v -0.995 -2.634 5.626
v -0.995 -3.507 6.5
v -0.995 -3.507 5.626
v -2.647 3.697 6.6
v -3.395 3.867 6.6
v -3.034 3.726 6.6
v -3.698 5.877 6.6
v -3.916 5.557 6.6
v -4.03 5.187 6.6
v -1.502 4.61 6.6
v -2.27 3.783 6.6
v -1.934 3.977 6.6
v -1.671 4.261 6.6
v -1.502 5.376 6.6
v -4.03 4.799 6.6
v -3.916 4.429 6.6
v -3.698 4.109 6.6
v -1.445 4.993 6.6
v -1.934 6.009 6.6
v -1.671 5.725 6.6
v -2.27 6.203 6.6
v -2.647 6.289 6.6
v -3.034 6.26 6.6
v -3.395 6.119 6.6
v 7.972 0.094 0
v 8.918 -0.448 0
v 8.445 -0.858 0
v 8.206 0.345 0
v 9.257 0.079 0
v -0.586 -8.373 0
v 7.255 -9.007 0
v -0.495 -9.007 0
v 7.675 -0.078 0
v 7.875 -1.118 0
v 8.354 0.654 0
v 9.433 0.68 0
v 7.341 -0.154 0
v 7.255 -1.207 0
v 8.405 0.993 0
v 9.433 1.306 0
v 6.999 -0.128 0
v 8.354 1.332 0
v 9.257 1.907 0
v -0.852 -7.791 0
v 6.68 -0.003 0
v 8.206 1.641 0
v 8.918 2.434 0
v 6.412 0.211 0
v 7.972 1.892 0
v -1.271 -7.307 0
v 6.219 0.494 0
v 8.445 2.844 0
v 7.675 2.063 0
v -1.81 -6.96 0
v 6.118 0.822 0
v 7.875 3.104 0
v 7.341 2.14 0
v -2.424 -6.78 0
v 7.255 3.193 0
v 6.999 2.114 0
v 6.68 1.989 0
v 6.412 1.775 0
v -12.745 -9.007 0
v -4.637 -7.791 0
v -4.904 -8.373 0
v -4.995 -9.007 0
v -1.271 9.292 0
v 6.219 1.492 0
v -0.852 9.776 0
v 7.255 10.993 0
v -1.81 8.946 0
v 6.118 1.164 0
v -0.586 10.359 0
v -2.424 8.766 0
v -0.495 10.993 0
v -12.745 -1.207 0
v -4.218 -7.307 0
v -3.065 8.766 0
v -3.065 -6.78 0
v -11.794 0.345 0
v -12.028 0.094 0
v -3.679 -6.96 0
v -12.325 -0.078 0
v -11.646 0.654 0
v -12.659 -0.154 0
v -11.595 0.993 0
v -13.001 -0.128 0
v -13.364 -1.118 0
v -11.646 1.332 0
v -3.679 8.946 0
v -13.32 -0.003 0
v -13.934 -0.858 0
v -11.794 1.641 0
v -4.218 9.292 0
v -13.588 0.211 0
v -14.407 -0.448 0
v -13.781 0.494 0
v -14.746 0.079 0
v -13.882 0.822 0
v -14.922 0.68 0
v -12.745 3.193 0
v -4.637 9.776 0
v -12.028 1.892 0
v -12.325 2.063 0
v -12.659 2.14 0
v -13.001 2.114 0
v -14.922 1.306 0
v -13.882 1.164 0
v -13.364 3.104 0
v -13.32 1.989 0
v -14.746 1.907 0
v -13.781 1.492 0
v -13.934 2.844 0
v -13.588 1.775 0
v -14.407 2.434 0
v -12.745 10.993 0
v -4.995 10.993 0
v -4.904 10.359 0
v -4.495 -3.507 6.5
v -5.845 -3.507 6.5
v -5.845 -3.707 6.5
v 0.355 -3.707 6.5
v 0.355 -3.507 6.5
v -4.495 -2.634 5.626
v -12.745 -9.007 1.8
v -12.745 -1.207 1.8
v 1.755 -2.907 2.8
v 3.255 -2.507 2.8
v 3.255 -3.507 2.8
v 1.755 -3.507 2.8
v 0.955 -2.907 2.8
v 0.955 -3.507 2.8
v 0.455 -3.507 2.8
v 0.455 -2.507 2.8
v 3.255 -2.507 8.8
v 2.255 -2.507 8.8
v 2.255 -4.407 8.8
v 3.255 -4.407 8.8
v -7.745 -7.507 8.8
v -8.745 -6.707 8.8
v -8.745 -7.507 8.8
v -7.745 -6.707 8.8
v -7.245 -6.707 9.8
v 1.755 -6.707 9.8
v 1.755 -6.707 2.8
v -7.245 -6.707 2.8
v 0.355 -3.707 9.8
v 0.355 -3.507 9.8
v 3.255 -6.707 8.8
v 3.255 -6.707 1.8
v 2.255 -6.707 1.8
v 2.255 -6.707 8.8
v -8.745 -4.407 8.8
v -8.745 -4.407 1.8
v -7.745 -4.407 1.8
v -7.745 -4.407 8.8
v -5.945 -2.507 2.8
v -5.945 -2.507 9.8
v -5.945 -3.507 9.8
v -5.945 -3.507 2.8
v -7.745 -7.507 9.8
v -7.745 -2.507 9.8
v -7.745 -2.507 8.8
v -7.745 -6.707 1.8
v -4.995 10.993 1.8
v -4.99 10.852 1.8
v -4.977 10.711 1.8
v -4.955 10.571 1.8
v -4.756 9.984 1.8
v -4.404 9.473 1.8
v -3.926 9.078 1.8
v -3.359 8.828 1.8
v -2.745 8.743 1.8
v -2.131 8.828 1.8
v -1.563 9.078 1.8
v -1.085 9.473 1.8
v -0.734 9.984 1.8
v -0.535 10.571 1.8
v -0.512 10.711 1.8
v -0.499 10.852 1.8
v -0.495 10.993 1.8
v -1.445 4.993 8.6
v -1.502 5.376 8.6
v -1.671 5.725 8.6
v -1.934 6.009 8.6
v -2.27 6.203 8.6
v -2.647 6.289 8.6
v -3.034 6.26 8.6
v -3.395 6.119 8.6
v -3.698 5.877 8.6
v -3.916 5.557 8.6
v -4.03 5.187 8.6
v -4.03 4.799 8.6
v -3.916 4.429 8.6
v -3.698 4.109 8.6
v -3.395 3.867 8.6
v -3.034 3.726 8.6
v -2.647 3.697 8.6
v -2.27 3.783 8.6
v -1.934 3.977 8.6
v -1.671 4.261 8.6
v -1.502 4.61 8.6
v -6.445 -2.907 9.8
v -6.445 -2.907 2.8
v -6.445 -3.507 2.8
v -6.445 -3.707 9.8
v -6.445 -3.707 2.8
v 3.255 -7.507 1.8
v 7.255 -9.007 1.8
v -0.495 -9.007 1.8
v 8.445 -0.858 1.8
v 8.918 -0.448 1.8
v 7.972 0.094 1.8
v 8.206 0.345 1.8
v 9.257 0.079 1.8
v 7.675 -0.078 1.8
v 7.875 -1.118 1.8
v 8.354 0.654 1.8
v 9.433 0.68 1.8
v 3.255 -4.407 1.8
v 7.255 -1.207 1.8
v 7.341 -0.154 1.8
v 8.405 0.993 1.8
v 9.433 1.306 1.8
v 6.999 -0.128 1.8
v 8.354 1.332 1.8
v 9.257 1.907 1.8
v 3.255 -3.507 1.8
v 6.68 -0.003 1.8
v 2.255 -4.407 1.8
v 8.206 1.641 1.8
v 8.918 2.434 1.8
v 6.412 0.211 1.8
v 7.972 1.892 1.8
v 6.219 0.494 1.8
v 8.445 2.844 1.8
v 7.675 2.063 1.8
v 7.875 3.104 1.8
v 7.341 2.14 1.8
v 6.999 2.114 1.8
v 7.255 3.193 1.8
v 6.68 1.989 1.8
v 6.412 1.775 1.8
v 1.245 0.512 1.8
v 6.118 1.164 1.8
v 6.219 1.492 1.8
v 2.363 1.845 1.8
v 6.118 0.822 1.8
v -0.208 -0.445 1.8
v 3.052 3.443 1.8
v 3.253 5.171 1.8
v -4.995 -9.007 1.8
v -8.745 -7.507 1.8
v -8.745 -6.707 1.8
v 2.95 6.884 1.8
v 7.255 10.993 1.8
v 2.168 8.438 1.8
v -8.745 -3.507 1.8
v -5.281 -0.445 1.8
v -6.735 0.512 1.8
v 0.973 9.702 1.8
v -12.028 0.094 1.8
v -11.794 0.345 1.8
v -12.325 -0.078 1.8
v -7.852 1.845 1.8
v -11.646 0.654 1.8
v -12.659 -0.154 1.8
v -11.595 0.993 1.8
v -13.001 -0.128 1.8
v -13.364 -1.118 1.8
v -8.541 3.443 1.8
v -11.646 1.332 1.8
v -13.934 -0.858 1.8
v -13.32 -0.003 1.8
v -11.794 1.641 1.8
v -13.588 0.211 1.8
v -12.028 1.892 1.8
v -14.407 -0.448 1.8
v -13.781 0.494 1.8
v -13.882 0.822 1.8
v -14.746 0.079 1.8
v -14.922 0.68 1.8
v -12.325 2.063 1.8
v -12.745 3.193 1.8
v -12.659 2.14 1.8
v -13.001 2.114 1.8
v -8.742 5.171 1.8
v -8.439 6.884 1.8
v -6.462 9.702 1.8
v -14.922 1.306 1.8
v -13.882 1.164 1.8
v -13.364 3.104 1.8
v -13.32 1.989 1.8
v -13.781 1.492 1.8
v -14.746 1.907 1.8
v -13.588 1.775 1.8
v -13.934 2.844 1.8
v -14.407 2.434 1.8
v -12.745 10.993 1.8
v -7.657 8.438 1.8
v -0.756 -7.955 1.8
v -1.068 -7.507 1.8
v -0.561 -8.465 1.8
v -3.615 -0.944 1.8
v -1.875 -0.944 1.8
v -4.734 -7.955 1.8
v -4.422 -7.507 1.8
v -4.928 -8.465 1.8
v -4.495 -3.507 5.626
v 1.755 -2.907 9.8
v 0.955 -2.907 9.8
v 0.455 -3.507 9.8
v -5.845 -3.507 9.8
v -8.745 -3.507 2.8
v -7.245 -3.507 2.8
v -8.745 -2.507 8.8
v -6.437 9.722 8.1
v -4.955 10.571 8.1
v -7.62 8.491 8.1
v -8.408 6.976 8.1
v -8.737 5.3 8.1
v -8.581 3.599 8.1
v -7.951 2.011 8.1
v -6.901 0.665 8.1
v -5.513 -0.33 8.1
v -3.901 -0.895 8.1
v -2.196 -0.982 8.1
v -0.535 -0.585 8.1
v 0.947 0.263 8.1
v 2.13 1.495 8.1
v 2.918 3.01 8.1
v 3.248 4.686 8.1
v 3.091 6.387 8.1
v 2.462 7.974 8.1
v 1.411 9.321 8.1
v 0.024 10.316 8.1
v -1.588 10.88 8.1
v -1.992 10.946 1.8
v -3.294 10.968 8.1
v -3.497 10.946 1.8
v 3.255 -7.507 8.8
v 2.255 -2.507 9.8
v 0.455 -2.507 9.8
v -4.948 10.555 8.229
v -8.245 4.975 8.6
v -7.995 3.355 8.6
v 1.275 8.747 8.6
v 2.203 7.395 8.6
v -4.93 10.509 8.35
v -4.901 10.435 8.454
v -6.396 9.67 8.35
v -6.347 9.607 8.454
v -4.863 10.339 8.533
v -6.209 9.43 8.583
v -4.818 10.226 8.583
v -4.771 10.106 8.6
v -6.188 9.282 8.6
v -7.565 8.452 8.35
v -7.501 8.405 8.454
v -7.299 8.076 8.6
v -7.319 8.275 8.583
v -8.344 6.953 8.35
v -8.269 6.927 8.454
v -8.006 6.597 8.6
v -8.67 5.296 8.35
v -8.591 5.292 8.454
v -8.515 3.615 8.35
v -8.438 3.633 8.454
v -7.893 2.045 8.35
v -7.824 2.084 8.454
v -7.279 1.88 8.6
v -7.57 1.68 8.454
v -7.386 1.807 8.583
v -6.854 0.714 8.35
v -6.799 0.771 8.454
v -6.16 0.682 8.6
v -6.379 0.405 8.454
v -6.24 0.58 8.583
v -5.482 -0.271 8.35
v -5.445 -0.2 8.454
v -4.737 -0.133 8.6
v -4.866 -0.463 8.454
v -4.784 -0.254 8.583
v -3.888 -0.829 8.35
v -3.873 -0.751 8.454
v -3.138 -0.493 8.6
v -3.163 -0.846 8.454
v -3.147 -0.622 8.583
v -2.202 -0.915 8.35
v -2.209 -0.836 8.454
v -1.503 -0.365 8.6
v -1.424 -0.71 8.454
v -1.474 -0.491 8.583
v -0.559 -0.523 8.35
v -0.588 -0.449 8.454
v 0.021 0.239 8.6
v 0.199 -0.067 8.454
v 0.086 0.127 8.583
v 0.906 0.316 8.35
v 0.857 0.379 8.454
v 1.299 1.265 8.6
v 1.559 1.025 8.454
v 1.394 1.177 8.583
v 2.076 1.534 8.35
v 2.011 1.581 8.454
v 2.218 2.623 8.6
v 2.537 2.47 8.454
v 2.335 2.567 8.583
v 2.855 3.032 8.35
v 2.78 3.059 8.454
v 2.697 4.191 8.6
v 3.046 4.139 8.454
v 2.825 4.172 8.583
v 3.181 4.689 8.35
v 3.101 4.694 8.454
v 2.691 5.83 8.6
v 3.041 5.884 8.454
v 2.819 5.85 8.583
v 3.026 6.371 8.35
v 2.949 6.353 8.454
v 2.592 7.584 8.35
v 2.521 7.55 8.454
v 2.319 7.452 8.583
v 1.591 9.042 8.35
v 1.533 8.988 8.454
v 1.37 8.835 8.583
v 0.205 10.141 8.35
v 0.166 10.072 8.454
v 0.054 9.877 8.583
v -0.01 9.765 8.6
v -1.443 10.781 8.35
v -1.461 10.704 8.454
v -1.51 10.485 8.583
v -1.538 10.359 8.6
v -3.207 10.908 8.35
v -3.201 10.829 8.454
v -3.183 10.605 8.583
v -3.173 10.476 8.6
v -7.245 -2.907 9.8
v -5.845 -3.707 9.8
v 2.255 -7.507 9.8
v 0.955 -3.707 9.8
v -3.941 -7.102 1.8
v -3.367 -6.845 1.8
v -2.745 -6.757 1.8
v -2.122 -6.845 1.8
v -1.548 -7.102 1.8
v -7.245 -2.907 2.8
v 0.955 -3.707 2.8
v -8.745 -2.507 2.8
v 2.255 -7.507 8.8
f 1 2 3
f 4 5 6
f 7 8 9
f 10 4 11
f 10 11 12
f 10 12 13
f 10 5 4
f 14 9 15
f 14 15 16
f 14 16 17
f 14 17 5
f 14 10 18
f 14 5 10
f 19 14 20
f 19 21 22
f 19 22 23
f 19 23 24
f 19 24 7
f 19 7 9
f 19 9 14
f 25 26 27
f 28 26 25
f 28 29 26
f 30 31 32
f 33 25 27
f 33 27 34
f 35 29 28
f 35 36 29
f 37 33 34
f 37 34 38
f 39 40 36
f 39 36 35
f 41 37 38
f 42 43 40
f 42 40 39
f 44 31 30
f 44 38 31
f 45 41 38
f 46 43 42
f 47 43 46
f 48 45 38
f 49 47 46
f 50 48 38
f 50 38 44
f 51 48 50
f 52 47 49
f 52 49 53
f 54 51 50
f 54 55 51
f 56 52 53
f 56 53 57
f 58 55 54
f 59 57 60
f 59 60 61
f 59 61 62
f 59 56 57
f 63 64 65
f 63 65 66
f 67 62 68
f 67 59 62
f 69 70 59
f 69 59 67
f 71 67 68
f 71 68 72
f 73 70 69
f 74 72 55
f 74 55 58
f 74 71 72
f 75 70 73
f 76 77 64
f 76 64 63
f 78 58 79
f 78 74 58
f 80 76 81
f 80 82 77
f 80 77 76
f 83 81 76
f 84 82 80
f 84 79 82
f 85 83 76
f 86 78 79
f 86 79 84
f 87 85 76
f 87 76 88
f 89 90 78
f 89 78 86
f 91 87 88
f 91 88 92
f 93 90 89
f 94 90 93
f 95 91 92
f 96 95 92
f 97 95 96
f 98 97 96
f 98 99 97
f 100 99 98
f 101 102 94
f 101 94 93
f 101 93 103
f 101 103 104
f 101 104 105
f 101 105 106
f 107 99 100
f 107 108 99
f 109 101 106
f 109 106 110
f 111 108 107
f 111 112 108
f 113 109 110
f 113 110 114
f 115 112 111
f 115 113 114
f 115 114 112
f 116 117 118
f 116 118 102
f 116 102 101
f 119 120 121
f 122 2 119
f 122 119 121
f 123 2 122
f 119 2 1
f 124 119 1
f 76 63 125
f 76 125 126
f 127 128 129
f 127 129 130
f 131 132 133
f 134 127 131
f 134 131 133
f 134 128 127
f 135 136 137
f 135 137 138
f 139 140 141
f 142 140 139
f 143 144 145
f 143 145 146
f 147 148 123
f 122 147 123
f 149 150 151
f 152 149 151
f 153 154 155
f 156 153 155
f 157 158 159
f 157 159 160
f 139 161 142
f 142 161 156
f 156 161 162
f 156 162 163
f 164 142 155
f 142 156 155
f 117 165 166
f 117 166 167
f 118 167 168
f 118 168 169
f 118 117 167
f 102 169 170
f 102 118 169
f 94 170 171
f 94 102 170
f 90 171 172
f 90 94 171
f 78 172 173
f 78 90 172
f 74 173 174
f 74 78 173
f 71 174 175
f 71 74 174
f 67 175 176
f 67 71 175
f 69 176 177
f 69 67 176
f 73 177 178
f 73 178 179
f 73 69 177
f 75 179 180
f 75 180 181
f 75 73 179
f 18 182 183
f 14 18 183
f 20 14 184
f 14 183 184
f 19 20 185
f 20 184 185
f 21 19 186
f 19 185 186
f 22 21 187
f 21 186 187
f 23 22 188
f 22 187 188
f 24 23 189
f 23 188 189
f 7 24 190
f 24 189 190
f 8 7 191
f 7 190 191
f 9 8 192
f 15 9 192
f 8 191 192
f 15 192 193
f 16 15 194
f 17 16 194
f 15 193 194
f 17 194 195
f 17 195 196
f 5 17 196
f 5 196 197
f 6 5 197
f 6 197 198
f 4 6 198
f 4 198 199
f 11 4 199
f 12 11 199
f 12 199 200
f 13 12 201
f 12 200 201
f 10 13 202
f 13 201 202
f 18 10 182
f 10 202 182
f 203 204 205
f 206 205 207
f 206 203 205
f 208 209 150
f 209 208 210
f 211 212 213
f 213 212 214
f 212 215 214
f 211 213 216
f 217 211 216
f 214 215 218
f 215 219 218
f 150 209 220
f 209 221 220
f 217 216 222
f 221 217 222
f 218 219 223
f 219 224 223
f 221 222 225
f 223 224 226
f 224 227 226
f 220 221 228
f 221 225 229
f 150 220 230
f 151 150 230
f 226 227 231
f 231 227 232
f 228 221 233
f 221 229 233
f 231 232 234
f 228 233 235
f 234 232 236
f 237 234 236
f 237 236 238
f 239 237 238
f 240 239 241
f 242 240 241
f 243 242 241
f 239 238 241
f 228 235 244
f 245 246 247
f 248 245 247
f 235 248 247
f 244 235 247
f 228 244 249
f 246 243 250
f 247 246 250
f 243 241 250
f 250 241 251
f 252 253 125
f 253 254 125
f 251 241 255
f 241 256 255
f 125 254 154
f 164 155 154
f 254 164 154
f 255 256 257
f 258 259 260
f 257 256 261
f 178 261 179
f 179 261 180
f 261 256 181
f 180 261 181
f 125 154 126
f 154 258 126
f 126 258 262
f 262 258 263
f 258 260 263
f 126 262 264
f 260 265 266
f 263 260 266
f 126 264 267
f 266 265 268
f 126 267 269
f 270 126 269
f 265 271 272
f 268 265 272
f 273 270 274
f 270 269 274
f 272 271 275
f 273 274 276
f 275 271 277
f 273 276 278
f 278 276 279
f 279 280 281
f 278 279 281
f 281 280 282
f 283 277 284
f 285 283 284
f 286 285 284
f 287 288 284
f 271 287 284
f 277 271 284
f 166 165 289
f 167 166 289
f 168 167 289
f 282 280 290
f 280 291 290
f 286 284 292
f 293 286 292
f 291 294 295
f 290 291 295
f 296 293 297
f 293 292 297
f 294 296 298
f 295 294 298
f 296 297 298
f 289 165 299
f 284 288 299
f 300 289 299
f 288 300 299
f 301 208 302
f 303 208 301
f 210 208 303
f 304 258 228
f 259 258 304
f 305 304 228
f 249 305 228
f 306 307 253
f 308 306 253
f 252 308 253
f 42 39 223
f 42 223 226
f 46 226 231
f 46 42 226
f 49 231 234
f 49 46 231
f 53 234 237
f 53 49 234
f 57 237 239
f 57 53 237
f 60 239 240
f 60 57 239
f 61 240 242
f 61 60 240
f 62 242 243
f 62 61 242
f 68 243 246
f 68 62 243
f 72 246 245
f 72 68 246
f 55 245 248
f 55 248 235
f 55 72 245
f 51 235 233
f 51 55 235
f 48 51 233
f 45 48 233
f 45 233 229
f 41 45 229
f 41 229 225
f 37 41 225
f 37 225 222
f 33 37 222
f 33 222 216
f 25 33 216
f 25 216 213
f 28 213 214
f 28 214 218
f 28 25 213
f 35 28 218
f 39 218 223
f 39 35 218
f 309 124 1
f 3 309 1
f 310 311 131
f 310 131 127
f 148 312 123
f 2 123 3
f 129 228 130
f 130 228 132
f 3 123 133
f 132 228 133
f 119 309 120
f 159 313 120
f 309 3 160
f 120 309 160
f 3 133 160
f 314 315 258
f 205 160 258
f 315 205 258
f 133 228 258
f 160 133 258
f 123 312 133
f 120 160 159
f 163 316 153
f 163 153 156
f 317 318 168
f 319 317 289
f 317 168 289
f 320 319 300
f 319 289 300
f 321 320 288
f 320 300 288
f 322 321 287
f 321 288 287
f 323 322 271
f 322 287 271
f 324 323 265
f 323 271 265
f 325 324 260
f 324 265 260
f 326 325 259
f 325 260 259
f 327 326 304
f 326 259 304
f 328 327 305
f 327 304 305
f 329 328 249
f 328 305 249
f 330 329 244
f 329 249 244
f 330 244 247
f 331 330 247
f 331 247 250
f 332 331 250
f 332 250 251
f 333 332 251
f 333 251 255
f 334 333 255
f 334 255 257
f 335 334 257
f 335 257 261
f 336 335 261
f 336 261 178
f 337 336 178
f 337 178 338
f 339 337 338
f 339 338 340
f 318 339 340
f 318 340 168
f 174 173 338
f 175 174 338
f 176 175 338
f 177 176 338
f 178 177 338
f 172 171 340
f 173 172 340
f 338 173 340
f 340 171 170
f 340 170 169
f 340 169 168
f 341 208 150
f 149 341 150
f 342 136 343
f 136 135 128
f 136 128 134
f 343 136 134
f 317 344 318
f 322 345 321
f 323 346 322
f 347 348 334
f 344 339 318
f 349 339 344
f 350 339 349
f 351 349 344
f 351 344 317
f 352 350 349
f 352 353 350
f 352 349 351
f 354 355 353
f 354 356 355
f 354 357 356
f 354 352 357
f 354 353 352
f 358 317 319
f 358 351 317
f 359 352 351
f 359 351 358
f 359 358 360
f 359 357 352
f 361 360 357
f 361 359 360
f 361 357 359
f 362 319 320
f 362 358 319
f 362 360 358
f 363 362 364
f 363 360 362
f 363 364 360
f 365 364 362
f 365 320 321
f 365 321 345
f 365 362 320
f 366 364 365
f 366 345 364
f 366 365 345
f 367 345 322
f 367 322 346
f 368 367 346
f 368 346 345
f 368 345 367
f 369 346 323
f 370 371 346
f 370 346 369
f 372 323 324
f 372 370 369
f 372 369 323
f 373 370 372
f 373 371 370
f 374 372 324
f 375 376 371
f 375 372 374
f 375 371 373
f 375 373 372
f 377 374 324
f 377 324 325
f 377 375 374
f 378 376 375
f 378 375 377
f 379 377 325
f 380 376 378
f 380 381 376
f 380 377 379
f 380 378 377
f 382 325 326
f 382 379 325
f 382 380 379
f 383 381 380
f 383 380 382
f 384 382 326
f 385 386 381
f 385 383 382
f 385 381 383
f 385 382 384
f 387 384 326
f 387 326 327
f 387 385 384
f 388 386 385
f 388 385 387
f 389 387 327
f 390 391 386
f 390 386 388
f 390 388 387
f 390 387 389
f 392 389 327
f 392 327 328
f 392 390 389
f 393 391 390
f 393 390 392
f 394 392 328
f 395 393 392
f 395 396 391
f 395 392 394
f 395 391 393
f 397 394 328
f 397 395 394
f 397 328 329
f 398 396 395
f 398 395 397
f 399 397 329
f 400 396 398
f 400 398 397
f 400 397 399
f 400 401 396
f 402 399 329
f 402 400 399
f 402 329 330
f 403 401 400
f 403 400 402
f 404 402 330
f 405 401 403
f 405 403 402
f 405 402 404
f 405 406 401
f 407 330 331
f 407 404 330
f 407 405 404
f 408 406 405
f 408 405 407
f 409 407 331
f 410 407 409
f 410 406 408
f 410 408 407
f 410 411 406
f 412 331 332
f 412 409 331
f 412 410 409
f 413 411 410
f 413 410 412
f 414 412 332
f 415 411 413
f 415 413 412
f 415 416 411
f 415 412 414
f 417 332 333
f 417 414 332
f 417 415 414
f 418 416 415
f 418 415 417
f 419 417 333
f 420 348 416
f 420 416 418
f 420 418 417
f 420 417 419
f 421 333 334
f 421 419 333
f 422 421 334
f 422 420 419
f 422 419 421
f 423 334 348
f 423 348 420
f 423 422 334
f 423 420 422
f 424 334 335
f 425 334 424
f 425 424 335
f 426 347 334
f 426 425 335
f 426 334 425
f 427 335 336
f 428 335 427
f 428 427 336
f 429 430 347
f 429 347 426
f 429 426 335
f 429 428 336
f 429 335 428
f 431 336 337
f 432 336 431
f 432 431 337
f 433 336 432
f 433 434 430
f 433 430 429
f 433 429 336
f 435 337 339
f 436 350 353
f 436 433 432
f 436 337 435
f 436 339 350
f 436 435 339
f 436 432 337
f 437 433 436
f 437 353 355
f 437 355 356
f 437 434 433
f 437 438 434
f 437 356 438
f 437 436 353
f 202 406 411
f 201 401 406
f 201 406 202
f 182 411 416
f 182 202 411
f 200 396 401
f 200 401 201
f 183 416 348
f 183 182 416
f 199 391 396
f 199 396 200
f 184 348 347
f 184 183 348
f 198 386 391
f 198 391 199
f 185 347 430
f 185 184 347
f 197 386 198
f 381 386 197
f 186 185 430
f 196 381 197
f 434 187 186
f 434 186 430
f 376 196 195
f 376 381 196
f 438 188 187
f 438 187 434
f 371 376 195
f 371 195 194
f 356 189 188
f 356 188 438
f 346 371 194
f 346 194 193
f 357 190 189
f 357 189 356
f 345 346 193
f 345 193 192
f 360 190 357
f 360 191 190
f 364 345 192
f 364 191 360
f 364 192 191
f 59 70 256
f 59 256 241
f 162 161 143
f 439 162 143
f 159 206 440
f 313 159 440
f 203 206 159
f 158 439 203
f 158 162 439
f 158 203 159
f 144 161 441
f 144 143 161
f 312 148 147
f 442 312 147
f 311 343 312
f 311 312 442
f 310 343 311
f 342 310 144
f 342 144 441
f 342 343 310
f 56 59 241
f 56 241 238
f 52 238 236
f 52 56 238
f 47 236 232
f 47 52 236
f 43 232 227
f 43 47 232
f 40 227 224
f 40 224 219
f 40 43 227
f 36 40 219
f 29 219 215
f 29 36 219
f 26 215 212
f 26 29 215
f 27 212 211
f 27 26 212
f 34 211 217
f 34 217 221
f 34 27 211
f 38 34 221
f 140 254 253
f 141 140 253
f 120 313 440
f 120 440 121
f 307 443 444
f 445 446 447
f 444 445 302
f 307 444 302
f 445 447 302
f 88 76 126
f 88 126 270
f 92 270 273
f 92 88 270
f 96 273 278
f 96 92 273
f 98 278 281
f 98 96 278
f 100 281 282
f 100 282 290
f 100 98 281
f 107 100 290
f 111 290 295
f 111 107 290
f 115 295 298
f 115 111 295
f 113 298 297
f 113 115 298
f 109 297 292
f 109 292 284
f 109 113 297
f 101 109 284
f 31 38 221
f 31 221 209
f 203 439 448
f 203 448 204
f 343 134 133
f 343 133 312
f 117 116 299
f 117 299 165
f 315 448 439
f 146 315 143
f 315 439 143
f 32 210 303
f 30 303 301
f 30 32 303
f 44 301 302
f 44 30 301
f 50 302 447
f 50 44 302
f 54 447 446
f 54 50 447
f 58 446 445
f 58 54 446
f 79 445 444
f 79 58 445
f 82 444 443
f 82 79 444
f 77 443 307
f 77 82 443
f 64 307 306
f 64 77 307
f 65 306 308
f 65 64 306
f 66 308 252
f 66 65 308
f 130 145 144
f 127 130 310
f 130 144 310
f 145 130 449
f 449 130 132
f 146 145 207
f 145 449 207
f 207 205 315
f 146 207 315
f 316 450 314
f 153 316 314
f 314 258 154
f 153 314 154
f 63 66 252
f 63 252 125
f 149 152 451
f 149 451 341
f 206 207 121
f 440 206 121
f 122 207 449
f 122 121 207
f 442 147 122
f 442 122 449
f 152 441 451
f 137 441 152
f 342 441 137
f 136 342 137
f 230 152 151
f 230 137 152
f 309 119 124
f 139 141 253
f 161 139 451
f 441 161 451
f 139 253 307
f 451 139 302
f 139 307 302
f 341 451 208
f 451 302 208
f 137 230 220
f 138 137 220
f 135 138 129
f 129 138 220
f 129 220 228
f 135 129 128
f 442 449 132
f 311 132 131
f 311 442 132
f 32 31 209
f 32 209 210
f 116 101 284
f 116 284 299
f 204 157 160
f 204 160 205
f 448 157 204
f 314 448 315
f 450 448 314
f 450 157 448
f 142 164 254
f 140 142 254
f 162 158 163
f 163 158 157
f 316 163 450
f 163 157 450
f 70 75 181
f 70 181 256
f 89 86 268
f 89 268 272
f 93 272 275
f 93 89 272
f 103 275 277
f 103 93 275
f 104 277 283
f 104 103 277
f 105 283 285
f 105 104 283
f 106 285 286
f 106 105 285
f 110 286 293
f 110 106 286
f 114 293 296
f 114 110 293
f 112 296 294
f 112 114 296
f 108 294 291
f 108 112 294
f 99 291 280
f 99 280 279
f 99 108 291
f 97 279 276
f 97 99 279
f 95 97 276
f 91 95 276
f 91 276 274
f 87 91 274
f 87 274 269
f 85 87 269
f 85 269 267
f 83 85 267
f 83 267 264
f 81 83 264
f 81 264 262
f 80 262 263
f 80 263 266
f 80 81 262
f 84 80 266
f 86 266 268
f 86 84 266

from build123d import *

# Parameters (mm, degrees)
ESQUISSE1_R             = 1.15
BOSS_EXTRU_1_DEPTH      = 1.8
BOSS_EXTRU_2_DEPTH      = 8
ENL_V_MAT_EXTRU_1_DEPTH = 7
ESQUISSE4_W             = 3.5
ESQUISSE4_H             = 0.873592076
ENL_V_MAT_EXTRU_2_DEPTH = 1
ESQUISSE5_W             = 1
ESQUISSE5_H             = 1
ENL_V_MAT_EXTRU_3_DEPTH = 11
ESQUISSE6_W             = 6.2
ESQUISSE6_H             = 3.3
ENL_V_MAT_EXTRU_4_DEPTH = 1
CHANFREIN1_SIZE         = 1
ESQUISSE7_R             = 6
BOSS_EXTRU_3_DEPTH      = 6.8
CONG_1_R                = 0.5
ESQUISSE8_R             = 1.3
ENL_V_MAT_EXTRU_5_DEPTH = 2


with BuildPart() as part:
    # Esquisse1 → Boss.-Extru.1 (new body)
    with BuildSketch(Plane.XY):
        with BuildLine():
            Line((-12.744645331, 10.992907801), (-4.994645331, 10.992907801))
            ThreePointArc((-4.994645331, 10.992907801), (-2.744645331, 8.742907801), (-0.494645331, 10.992907801))
            Line((-0.494645331, 10.992907801), (7.255354669, 10.992907801))
            Line((7.255354669, 10.992907801), (7.255354669, 3.192907801))
            ThreePointArc((7.255354669, 3.192907801), (9.455354669, 0.992907801), (7.255354669, -1.207092199))
            Line((7.255354669, -1.207092199), (7.255354669, -9.007092199))
            Line((7.255354669, -9.007092199), (-0.494645331, -9.007092199))
            ThreePointArc((-0.494645331, -9.007092199), (-2.744645331, -6.757092199), (-4.994645331, -9.007092199))
            Line((-4.994645331, -9.007092199), (-12.744645331, -9.007092199))
            Line((-12.744645331, -9.007092199), (-12.744645331, -1.207092199))
            ThreePointArc((-12.744645331, -1.207092199), (-14.944645331, 0.992907801), (-12.744645331, 3.192907801))
            Line((-12.744645331, 3.192907801), (-12.744645331, 10.992907801))
        make_face()
        with Locations((-12.744645331, 0.992907801)):
            Circle(ESQUISSE1_R, mode=Mode.SUBTRACT)
        with Locations((7.255354669, 0.992907801)):
            Circle(ESQUISSE1_R, mode=Mode.SUBTRACT)
    extrude(amount=BOSS_EXTRU_1_DEPTH)

    # Esquisse2 → Boss.-Extru.2 (add)
    with BuildSketch(Plane.XY.offset(1.8)):
        Polygon((-8.744645331, -7.507092199), (3.255354669, -7.507092199), (3.255354669, -6.707092199), (2.255354669, -6.707092199), (2.255354669, -4.407092199), (3.255354669, -4.407092199), (3.255354669, -2.507092199), (-8.744645331, -2.507092199), (-8.744645331, -4.407092199), (-7.744645331, -4.407092199), (-7.744645331, -6.707092199), (-8.744645331, -6.707092199), align=None)
    extrude(amount=BOSS_EXTRU_2_DEPTH)

    # Esquisse3 → Enlèv. mat.-Extru.1 (cut)
    with BuildSketch(Plane.XY.offset(9.8)):
        Polygon((-6.444645331, -3.707092199), (0.955354669, -3.707092199), (0.955354669, -2.907092199), (1.755354669, -2.907092199), (1.755354669, -3.707092199), (1.755354669, -6.707092199), (-7.244645331, -6.707092199), (-7.244645331, -3.707092199), (-7.244645331, -2.907092199), (-6.444645331, -2.907092199), align=None)
    extrude(amount=-ENL_V_MAT_EXTRU_1_DEPTH, mode=Mode.SUBTRACT)

    # Esquisse4 → Enlèv. mat.-Extru.2 (cut)
    with BuildSketch(Plane(origin=(0, -2.507092199, 0), x_dir=(1, 0, 0), z_dir=(0, 1, 0))):
        Polygon((-8.744645331, -1.8), (3.255354669, -1.8), (3.255354669, -2.8), (0.455354669, -2.8), (0.455354669, -9.8), (-5.944645331, -9.8), (-5.944645331, -2.8), (-8.744645331, -2.8), align=None)
        with Locations((-2.744645331, -6.063203962)):
            Rectangle(ESQUISSE4_W, ESQUISSE4_H, mode=Mode.SUBTRACT)
    extrude(amount=-ENL_V_MAT_EXTRU_2_DEPTH, mode=Mode.SUBTRACT)

    # Esquisse5 → Enlèv. mat.-Extru.3 (cut)
    with BuildSketch(Plane(origin=(0, -2.507092199, 0), x_dir=(1, 0, 0), z_dir=(0, 1, 0))):
        with Locations((-8.244645331, -9.3)):
            Rectangle(ESQUISSE5_W, ESQUISSE5_H)
        with Locations((2.755354669, -9.3)):
            Rectangle(ESQUISSE5_W, ESQUISSE5_H)
    extrude(amount=-ENL_V_MAT_EXTRU_3_DEPTH, mode=Mode.SUBTRACT)

    # Esquisse6 → Enlèv. mat.-Extru.4 (cut)
    with BuildSketch(Plane(origin=(0, -3.507092199, 0), x_dir=(1, 0, 0), z_dir=(0, 1, 0))):
        with Locations((-2.744645331, -8.15)):
            Rectangle(ESQUISSE6_W, ESQUISSE6_H)
    extrude(amount=-ENL_V_MAT_EXTRU_4_DEPTH, mode=Mode.SUBTRACT)

    # Chanfrein1
    # the kernel refuses this chamfer: 1 mm, written as the material it takes off along each edge
    with BuildSketch(Plane(origin=(1.577037657, -2.507092199, 6.5), x_dir=(0, -0.9996219169112968, 0.027495876610586487), z_dir=(-1, 0, 0))) as chanfrein1_piece_1_section:
        Polygon((CHANFREIN1_SIZE * 0.999621916911, -CHANFREIN1_SIZE * 0.0274958766106), (-CHANFREIN1_SIZE * 0.0274958766106, -CHANFREIN1_SIZE * 0.999621916911), (0, 0), align=None)
    chanfrein1_piece_1 = extrude(amount=6.071682988, mode=Mode.PRIVATE)
    chanfrein1_piece_1 = split(chanfrein1_piece_1, bisect_by=Plane(origin=(0.455354669, -3.107092199, 6.3), z_dir=(-1, 0, 0)), keep=Keep.TOP, mode=Mode.PRIVATE)
    add(chanfrein1_piece_1, mode=Mode.SUBTRACT)

    # Esquisse7 → Boss.-Extru.3 (add)
    with BuildSketch(Plane.XY.offset(1.8)):
        with Locations(Location((-2.744645331, 4.992907801, 0), (0, 0, 111.61384575))):
            Circle(ESQUISSE7_R)
    extrude(amount=BOSS_EXTRU_3_DEPTH)

    # Congé1
    cong_1_edges = [part.edges().sort_by_distance(p)[0] for p in [
        (-0.534549974, -0.585217199, 8.6),
    ]]
    fillet(cong_1_edges, radius=CONG_1_R)

    # Esquisse8 → Enlèv. mat.-Extru.5 (cut)
    with BuildSketch(Plane.XY.offset(8.6)):
        with Locations((-2.744645331, 4.992907801)):
            Circle(ESQUISSE8_R)
    extrude(amount=-ENL_V_MAT_EXTRU_5_DEPTH, mode=Mode.SUBTRACT)


solid = part.part
